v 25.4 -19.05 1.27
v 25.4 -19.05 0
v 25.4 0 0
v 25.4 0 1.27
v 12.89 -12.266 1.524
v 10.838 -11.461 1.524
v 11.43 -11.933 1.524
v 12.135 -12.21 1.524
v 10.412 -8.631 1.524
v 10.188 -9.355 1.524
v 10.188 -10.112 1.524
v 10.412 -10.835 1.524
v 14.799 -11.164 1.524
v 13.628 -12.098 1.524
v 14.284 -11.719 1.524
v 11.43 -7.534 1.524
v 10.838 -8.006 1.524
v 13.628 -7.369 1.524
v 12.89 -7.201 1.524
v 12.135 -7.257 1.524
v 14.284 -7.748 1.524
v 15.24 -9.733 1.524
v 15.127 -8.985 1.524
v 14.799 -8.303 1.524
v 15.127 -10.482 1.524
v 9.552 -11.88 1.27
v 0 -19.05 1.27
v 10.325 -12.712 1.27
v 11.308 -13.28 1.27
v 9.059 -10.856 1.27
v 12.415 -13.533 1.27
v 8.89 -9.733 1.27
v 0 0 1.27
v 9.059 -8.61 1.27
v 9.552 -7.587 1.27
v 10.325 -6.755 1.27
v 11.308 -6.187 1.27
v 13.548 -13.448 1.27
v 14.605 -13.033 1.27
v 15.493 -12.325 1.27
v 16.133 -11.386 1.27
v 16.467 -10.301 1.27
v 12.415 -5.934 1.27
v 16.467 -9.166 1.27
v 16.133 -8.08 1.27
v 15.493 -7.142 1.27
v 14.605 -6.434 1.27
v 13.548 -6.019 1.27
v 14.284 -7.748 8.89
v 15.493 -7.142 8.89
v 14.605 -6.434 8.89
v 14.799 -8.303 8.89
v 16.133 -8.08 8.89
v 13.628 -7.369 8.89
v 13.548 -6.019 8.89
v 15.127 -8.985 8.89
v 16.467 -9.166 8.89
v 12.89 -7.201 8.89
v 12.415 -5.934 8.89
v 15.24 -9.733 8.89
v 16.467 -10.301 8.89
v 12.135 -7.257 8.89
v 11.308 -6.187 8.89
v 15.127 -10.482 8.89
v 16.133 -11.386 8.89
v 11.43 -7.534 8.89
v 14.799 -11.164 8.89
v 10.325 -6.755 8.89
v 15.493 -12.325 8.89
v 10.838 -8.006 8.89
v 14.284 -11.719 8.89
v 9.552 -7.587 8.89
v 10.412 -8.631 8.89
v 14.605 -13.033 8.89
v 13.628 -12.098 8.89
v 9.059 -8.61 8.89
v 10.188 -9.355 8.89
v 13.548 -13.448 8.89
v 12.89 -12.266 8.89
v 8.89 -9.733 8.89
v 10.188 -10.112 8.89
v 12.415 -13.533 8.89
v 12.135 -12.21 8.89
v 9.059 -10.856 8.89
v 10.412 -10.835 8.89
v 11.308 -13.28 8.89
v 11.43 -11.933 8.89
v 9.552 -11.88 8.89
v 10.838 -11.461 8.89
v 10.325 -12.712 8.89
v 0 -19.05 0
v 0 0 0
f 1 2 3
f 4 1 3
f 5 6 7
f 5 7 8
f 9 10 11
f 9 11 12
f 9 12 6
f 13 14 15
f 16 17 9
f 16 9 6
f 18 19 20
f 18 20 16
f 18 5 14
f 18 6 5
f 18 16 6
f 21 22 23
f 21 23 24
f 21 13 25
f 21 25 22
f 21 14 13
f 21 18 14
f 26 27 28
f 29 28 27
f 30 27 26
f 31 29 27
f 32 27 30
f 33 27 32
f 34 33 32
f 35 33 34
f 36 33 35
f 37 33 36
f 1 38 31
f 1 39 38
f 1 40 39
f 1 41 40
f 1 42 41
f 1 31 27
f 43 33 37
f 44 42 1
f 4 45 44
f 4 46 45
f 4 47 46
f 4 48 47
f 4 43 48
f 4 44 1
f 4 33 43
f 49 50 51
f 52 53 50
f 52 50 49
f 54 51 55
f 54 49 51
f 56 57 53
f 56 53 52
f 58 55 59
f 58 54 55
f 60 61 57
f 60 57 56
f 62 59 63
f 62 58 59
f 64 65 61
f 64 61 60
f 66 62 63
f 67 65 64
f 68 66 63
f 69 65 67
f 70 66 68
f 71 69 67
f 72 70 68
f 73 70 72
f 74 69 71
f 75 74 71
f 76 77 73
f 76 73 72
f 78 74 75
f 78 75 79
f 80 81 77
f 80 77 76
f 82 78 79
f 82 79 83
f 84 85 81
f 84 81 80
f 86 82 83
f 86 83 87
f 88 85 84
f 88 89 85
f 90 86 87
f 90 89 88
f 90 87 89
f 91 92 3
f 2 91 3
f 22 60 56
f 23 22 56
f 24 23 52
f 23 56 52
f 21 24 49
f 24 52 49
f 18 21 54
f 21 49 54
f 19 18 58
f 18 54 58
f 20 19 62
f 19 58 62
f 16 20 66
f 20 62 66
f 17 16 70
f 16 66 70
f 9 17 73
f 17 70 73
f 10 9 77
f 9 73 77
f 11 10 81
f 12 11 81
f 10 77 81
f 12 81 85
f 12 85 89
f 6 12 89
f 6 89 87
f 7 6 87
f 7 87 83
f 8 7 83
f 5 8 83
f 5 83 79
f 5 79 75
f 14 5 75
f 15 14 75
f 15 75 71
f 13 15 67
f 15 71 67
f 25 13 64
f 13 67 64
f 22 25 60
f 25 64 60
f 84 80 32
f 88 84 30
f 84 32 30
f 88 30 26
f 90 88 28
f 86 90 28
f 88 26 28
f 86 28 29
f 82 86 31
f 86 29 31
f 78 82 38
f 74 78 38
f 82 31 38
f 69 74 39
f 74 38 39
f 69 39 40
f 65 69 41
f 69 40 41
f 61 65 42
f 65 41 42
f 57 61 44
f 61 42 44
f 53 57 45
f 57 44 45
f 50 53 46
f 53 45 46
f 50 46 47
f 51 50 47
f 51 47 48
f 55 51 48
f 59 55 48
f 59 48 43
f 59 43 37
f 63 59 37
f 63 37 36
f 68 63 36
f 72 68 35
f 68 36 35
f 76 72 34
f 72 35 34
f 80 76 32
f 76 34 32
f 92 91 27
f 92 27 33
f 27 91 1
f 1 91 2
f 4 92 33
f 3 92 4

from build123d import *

# Parameters (mm, degrees)
SKETCH2_W           = 25.4
SKETCH2_H           = 19.05
BOSS_EXTRUDE1_DEPTH = 1.27
SKETCH3_R           = 3.81
BOSS_EXTRUDE2_DEPTH = 7.62
SKETCH4_R           = 2.54
CUT_EXTRUDE1_DEPTH  = 7.366


with BuildPart() as part:
    # Sketch2 → Boss-Extrude1 (new body)
    with BuildSketch(Plane.XY):
        with Locations((12.7, -9.525)):
            Rectangle(SKETCH2_W, SKETCH2_H)
    extrude(amount=BOSS_EXTRUDE1_DEPTH)

    # Sketch3 → Boss-Extrude2 (add)
    with BuildSketch(Plane.XY.offset(1.27)):
        with Locations(Location((12.7, -9.733398963, 0), (0, 0, 180))):
            Circle(SKETCH3_R)
    extrude(amount=BOSS_EXTRUDE2_DEPTH)

    # Sketch4 → Cut-Extrude1 (cut)
    with BuildSketch(Plane.XY.offset(8.89)):
        with Locations((12.7, -9.733398963)):
            Circle(SKETCH4_R)
    extrude(amount=-CUT_EXTRUDE1_DEPTH, mode=Mode.SUBTRACT)


solid = part.part
